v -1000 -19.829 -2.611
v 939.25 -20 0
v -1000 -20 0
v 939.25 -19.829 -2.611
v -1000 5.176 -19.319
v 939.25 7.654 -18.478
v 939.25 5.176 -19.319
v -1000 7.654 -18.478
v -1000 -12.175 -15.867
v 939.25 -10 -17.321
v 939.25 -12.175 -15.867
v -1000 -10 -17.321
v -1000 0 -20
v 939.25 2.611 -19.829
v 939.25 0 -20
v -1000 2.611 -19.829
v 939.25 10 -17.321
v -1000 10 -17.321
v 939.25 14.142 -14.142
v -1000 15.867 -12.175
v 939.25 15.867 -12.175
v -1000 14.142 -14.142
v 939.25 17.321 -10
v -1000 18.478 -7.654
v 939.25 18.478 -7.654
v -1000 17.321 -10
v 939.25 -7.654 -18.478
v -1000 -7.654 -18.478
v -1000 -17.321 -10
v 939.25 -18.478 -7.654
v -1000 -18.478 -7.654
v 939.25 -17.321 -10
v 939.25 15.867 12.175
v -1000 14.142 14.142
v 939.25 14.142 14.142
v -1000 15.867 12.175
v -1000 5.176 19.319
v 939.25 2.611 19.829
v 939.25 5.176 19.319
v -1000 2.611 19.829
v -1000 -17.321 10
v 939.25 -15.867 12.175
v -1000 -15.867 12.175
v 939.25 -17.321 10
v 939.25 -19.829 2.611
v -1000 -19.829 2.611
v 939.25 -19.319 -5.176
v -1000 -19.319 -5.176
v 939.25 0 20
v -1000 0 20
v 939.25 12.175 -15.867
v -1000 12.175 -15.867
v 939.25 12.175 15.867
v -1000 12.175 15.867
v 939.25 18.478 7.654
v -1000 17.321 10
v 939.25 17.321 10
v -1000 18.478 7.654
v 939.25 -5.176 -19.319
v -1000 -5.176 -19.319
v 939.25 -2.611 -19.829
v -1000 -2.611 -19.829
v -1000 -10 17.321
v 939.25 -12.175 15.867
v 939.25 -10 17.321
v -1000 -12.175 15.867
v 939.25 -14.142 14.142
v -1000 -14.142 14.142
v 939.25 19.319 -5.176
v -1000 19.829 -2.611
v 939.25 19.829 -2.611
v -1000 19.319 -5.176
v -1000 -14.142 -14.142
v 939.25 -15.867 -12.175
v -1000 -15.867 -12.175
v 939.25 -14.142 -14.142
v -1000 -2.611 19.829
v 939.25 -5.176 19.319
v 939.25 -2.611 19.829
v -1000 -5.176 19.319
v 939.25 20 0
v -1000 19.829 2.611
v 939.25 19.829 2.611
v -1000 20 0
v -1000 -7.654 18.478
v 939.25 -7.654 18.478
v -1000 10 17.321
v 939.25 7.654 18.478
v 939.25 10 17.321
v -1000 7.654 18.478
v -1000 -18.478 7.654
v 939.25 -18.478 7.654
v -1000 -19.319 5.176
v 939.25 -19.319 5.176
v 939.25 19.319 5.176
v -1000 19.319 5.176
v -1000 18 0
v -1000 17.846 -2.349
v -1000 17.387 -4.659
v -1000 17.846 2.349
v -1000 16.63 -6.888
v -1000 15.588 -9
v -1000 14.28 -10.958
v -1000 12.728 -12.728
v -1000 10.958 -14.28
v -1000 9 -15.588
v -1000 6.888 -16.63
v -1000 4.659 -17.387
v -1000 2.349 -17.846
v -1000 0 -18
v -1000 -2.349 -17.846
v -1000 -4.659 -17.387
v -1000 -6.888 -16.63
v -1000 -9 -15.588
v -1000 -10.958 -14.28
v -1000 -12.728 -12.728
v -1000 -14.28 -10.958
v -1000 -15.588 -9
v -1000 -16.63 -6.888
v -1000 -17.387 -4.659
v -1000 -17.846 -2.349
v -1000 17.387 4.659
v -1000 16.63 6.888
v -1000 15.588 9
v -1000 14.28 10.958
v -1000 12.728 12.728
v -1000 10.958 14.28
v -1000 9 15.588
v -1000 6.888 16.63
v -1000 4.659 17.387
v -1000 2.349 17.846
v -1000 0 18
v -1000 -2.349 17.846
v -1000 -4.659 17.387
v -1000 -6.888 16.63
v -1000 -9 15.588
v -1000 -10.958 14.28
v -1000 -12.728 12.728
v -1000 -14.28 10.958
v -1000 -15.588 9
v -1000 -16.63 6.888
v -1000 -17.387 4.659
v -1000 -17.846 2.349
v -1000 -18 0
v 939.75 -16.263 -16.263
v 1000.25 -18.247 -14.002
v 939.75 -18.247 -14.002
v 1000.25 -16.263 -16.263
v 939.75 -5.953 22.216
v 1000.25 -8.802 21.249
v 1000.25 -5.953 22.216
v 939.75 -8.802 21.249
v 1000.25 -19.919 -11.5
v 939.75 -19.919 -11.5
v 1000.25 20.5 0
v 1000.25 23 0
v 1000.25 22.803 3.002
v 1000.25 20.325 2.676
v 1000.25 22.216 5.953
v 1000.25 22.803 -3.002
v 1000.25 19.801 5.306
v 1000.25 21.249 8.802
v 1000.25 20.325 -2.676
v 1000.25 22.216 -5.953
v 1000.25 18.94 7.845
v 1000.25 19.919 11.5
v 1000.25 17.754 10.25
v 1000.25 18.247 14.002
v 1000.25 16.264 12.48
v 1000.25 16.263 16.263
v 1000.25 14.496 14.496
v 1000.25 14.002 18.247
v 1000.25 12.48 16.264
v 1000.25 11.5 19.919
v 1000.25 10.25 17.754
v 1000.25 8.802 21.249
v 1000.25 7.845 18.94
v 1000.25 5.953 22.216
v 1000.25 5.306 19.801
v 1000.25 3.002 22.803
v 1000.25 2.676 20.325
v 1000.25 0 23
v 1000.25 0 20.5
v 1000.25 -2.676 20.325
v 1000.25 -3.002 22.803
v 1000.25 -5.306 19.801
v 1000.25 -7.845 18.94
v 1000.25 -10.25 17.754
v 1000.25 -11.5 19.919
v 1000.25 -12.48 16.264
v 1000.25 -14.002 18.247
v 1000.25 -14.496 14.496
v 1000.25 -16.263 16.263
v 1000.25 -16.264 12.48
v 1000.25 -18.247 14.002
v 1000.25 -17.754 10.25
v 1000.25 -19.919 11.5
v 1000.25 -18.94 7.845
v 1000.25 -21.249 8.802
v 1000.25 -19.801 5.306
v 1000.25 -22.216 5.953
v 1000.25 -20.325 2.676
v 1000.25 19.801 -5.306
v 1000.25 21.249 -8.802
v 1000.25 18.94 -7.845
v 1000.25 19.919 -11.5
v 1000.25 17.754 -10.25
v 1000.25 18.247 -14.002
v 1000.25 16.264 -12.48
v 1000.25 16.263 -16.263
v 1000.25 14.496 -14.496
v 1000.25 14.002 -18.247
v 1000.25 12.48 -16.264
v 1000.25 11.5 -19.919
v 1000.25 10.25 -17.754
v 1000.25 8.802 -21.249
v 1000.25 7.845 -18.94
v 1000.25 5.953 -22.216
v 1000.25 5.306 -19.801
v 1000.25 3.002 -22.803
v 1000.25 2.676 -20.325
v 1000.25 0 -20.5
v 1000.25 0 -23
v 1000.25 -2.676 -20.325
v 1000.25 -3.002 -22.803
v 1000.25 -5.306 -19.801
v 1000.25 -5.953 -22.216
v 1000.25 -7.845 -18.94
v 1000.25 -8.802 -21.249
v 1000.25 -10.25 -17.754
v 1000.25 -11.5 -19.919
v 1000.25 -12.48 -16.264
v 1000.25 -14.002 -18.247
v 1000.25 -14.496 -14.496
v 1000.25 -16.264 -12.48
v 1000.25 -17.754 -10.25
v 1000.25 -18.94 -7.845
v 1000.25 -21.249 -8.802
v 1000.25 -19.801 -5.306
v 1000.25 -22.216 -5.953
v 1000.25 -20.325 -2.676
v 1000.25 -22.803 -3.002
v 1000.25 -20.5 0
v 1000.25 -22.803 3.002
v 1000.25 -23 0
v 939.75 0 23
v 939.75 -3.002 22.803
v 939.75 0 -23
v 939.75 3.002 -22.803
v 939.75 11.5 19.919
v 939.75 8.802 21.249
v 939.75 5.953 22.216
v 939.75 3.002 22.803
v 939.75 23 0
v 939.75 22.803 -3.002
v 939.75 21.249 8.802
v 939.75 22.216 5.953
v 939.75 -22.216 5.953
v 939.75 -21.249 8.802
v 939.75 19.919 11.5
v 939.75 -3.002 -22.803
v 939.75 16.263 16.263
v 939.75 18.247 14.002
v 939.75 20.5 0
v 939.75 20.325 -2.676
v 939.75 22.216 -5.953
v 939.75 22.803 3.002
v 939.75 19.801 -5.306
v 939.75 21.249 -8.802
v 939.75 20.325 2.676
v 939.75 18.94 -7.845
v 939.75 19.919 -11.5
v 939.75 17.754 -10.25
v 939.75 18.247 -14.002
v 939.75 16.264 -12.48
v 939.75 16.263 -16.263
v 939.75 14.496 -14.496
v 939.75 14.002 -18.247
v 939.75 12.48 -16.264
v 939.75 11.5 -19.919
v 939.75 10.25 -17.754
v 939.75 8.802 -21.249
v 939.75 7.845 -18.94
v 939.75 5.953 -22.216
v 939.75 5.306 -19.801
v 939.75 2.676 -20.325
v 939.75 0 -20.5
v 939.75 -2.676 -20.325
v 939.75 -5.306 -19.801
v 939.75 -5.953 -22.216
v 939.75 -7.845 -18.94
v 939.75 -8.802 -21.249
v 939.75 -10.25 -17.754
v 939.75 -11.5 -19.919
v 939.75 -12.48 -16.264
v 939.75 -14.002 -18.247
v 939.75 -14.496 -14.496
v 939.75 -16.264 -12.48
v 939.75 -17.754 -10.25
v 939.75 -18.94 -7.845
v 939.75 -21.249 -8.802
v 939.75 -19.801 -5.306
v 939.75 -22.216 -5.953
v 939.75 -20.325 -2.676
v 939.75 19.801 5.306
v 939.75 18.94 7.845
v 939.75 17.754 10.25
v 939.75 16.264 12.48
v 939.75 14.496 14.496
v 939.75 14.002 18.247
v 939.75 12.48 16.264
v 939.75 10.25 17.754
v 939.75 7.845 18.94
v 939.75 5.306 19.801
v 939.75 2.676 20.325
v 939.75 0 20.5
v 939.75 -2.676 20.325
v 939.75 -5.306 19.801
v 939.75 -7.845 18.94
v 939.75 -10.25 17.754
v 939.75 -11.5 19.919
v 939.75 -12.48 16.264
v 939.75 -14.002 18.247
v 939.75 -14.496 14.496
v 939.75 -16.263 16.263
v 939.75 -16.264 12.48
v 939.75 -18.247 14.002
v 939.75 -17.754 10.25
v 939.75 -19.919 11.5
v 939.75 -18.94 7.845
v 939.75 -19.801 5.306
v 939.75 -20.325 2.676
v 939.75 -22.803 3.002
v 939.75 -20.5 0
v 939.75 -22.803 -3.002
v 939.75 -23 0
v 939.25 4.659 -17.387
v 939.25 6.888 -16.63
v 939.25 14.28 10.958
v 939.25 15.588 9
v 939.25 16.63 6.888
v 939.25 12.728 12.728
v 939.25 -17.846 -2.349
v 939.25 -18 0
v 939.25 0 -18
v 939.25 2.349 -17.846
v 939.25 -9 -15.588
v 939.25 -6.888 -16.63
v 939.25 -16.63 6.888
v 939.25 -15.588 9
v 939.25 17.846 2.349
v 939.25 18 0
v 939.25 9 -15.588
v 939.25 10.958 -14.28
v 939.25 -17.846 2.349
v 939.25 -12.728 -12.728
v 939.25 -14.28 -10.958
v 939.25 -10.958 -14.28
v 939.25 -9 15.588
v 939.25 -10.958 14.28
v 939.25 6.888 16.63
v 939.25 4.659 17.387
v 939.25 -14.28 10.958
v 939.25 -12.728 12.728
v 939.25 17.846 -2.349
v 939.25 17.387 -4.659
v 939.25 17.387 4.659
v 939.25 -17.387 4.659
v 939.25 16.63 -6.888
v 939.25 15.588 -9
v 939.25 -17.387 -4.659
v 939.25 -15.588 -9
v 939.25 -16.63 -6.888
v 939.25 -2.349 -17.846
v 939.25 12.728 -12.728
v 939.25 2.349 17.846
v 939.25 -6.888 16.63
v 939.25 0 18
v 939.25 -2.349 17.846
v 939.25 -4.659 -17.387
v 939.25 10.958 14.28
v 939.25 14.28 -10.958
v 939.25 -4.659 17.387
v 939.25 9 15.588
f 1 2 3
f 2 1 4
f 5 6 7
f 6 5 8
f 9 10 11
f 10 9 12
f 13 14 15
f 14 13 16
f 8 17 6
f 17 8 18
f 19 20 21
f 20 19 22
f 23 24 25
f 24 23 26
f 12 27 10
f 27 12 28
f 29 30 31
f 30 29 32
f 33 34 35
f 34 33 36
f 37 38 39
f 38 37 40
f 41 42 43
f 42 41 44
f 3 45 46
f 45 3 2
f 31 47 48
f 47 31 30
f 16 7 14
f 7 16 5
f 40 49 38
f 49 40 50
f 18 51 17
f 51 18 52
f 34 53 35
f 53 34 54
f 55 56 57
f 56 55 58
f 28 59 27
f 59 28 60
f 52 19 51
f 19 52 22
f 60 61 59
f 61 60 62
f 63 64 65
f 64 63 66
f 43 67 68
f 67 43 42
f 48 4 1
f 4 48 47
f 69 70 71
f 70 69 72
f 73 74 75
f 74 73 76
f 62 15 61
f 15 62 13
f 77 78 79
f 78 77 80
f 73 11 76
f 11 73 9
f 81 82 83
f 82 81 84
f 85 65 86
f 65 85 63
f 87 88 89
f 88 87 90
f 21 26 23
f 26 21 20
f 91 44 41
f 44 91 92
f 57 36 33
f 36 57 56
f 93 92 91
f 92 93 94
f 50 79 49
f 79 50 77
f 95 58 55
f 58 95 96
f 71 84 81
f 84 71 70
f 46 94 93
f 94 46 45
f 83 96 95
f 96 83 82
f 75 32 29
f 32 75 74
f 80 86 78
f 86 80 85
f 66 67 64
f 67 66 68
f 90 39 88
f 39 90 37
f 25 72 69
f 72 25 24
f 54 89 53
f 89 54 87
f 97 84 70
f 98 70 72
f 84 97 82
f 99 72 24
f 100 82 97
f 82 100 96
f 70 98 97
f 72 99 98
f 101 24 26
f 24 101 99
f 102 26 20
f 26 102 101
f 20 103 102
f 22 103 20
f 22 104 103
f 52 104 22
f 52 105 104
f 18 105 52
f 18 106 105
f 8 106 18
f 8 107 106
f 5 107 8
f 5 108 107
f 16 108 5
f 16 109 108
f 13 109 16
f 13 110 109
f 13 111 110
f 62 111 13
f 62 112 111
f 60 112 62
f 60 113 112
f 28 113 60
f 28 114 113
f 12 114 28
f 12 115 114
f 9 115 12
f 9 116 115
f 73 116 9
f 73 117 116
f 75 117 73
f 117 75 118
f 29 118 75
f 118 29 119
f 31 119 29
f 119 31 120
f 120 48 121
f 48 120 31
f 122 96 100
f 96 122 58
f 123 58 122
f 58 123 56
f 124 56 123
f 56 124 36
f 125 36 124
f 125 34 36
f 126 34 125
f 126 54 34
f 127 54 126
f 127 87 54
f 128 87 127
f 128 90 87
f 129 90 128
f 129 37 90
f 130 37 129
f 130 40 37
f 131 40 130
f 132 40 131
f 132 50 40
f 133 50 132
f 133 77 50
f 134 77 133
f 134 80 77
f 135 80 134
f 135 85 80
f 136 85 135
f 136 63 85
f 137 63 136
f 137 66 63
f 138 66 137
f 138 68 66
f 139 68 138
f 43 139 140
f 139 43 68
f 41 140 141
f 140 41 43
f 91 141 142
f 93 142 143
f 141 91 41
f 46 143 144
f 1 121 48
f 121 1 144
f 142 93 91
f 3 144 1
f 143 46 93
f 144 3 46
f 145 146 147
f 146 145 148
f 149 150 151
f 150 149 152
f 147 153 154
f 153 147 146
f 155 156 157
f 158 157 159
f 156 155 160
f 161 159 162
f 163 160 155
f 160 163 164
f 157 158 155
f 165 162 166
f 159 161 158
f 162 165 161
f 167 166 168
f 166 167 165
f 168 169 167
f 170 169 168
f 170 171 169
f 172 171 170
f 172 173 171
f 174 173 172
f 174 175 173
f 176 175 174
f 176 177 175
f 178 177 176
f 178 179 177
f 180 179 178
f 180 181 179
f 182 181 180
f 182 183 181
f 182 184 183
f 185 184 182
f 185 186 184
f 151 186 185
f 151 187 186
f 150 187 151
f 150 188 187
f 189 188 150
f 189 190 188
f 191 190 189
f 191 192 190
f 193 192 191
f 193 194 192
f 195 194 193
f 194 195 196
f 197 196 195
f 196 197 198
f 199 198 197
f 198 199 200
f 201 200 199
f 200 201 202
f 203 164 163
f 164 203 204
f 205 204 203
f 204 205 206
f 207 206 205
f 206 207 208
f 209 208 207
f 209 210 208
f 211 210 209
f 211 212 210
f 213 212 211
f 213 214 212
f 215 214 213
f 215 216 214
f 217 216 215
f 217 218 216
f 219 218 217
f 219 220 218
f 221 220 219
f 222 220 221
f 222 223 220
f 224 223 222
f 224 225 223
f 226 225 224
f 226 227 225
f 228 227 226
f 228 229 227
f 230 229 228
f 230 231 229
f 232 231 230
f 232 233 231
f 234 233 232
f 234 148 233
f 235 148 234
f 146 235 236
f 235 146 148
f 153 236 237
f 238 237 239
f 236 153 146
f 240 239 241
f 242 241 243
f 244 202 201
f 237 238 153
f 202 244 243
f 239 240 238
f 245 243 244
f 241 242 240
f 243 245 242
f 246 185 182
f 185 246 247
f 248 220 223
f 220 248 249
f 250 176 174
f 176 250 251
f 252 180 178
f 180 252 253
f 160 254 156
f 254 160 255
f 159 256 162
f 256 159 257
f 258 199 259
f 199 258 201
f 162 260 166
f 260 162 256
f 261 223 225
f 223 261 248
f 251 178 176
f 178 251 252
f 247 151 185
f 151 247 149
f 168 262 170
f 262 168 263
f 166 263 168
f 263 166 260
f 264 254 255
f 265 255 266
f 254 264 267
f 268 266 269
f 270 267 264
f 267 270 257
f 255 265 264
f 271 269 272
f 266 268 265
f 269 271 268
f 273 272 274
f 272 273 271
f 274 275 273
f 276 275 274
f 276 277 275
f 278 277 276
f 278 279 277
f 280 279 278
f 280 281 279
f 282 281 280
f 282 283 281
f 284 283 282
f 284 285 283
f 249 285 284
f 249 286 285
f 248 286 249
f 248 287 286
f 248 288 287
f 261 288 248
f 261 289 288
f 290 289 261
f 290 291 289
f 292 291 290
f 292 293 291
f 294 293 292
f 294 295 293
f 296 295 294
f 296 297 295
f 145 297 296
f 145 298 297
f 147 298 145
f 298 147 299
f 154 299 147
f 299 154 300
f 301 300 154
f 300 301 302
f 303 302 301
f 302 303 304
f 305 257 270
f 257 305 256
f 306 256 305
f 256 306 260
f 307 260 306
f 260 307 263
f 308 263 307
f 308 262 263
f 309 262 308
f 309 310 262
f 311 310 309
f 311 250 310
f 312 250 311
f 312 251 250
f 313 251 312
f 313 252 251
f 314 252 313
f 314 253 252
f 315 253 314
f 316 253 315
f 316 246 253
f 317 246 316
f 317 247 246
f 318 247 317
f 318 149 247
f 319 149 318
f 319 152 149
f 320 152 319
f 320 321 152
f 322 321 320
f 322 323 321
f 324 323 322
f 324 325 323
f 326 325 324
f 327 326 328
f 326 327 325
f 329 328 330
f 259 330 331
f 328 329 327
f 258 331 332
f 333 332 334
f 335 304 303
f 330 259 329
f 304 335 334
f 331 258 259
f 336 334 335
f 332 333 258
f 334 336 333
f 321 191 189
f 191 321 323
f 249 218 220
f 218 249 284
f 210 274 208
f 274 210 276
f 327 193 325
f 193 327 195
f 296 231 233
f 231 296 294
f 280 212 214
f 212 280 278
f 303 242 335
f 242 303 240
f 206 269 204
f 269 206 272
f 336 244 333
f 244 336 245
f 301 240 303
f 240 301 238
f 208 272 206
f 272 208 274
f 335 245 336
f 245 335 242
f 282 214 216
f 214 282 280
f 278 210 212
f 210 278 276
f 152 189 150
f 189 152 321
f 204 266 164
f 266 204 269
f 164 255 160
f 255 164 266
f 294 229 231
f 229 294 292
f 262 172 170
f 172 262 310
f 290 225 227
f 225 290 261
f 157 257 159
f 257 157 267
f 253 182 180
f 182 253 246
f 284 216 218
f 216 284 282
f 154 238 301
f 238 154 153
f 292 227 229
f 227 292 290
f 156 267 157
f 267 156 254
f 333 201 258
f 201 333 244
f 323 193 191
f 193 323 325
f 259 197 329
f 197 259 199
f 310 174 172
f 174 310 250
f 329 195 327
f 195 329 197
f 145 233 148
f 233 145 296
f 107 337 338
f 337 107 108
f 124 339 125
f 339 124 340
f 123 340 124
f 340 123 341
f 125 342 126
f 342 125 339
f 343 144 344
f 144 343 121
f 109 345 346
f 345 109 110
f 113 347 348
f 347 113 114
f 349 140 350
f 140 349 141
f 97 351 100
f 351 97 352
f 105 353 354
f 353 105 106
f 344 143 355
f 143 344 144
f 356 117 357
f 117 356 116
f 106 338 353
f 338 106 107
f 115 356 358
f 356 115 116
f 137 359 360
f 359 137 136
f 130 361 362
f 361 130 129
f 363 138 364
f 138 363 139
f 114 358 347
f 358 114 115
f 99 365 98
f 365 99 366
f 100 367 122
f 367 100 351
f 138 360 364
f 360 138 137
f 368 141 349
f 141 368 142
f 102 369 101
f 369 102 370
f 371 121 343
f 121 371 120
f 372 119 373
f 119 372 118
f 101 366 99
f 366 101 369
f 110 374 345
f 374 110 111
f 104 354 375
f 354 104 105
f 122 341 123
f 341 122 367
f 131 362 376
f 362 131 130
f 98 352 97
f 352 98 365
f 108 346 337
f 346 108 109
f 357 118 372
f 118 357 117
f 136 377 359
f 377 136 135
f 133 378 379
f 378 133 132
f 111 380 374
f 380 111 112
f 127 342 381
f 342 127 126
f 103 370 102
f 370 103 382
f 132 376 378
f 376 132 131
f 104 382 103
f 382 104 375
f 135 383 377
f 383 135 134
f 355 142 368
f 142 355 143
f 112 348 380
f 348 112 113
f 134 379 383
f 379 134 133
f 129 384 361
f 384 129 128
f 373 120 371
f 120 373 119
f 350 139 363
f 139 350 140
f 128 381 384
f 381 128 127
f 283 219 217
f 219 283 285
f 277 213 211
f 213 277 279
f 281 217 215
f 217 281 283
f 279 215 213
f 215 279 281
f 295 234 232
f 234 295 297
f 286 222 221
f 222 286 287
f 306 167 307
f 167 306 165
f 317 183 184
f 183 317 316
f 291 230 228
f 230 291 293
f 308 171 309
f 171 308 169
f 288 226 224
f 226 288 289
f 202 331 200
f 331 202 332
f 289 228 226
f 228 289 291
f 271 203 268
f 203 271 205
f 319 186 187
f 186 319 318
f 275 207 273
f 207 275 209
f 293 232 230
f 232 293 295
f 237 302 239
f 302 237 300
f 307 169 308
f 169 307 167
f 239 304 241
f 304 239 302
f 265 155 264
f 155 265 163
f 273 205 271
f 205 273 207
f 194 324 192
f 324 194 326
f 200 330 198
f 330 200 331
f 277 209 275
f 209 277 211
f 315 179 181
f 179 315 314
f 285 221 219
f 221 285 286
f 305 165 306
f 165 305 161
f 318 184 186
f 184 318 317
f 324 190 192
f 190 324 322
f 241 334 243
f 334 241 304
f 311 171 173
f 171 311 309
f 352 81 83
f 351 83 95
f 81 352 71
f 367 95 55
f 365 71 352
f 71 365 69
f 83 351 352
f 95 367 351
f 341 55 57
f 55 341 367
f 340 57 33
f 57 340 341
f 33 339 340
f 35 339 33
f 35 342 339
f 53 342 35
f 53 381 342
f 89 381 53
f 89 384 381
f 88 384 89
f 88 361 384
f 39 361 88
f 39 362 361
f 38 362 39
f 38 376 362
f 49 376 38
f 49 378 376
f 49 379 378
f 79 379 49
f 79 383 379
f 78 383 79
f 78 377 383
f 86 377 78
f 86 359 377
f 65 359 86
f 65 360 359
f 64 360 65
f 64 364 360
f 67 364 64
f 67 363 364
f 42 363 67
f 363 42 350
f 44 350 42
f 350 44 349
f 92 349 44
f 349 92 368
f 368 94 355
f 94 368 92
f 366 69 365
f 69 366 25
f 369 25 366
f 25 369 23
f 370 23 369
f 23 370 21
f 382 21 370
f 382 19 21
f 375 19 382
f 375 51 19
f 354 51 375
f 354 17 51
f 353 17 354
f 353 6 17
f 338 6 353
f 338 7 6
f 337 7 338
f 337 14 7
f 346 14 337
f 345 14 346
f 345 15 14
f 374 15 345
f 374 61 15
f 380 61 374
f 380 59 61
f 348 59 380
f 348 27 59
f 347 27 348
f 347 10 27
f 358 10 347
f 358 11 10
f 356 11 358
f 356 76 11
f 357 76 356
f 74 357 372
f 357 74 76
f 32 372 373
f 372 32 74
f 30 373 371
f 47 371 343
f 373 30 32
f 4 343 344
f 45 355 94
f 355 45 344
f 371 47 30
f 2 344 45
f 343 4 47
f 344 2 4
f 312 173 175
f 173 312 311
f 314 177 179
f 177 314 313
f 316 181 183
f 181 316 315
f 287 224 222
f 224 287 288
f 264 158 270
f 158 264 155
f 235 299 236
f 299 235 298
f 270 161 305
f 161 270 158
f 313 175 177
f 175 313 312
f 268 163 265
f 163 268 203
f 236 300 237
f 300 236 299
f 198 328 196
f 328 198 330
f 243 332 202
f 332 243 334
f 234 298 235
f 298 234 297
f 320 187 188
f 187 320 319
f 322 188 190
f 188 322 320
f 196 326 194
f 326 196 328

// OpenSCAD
// HT 40 pipe 2000 mm
// Simplified for fast rendering: single difference(), no extra chamfer solids.

$fn = 48;

// Parameters
pipe_length = 2000;          // mm
outer_diameter = 40;         // mm
wall_thickness = 2;          // mm

socket_length = 60;          // mm
socket_outer_diameter = 46;  // mm
socket_wall_thickness = 2.5; // mm

overlap = 0.5;               // mm (boolean safety)

// Derived
outer_r = outer_diameter/2;
inner_r = max(outer_r - wall_thickness, 0.01);

socket_outer_r = socket_outer_diameter/2;
socket_inner_r = max(socket_outer_r - socket_wall_thickness, 0.01);

// Helpers: cylinders along X (OpenSCAD cylinders are along Z by default)
module cyl_x(h, r=1, center=true) {
    rotate([0, 90, 0]) cylinder(h=h, r=r, center=center);
}

module pipe_fast() {
    difference() {
        // OUTER: main pipe + socket sleeve at +X end
        union() {
            cyl_x(pipe_length, outer_r, center=true);

            // Socket outer sleeve positioned at +X end
            translate([pipe_length/2 - socket_length/2, 0, 0])
                cyl_x(socket_length + overlap, socket_outer_r, center=true);
        }

        // INNER: main bore + socket bore
        union() {
            // Main bore (slightly longer for clean cut)
            cyl_x(pipe_length + 2*overlap, inner_r, center=true);

            // Socket bore (slightly longer for clean cut)
            translate([pipe_length/2 - socket_length/2, 0, 0])
                cyl_x(socket_length + 3*overlap, socket_inner_r, center=true);
        }
    }
}

color("Silver") pipe_fast();
